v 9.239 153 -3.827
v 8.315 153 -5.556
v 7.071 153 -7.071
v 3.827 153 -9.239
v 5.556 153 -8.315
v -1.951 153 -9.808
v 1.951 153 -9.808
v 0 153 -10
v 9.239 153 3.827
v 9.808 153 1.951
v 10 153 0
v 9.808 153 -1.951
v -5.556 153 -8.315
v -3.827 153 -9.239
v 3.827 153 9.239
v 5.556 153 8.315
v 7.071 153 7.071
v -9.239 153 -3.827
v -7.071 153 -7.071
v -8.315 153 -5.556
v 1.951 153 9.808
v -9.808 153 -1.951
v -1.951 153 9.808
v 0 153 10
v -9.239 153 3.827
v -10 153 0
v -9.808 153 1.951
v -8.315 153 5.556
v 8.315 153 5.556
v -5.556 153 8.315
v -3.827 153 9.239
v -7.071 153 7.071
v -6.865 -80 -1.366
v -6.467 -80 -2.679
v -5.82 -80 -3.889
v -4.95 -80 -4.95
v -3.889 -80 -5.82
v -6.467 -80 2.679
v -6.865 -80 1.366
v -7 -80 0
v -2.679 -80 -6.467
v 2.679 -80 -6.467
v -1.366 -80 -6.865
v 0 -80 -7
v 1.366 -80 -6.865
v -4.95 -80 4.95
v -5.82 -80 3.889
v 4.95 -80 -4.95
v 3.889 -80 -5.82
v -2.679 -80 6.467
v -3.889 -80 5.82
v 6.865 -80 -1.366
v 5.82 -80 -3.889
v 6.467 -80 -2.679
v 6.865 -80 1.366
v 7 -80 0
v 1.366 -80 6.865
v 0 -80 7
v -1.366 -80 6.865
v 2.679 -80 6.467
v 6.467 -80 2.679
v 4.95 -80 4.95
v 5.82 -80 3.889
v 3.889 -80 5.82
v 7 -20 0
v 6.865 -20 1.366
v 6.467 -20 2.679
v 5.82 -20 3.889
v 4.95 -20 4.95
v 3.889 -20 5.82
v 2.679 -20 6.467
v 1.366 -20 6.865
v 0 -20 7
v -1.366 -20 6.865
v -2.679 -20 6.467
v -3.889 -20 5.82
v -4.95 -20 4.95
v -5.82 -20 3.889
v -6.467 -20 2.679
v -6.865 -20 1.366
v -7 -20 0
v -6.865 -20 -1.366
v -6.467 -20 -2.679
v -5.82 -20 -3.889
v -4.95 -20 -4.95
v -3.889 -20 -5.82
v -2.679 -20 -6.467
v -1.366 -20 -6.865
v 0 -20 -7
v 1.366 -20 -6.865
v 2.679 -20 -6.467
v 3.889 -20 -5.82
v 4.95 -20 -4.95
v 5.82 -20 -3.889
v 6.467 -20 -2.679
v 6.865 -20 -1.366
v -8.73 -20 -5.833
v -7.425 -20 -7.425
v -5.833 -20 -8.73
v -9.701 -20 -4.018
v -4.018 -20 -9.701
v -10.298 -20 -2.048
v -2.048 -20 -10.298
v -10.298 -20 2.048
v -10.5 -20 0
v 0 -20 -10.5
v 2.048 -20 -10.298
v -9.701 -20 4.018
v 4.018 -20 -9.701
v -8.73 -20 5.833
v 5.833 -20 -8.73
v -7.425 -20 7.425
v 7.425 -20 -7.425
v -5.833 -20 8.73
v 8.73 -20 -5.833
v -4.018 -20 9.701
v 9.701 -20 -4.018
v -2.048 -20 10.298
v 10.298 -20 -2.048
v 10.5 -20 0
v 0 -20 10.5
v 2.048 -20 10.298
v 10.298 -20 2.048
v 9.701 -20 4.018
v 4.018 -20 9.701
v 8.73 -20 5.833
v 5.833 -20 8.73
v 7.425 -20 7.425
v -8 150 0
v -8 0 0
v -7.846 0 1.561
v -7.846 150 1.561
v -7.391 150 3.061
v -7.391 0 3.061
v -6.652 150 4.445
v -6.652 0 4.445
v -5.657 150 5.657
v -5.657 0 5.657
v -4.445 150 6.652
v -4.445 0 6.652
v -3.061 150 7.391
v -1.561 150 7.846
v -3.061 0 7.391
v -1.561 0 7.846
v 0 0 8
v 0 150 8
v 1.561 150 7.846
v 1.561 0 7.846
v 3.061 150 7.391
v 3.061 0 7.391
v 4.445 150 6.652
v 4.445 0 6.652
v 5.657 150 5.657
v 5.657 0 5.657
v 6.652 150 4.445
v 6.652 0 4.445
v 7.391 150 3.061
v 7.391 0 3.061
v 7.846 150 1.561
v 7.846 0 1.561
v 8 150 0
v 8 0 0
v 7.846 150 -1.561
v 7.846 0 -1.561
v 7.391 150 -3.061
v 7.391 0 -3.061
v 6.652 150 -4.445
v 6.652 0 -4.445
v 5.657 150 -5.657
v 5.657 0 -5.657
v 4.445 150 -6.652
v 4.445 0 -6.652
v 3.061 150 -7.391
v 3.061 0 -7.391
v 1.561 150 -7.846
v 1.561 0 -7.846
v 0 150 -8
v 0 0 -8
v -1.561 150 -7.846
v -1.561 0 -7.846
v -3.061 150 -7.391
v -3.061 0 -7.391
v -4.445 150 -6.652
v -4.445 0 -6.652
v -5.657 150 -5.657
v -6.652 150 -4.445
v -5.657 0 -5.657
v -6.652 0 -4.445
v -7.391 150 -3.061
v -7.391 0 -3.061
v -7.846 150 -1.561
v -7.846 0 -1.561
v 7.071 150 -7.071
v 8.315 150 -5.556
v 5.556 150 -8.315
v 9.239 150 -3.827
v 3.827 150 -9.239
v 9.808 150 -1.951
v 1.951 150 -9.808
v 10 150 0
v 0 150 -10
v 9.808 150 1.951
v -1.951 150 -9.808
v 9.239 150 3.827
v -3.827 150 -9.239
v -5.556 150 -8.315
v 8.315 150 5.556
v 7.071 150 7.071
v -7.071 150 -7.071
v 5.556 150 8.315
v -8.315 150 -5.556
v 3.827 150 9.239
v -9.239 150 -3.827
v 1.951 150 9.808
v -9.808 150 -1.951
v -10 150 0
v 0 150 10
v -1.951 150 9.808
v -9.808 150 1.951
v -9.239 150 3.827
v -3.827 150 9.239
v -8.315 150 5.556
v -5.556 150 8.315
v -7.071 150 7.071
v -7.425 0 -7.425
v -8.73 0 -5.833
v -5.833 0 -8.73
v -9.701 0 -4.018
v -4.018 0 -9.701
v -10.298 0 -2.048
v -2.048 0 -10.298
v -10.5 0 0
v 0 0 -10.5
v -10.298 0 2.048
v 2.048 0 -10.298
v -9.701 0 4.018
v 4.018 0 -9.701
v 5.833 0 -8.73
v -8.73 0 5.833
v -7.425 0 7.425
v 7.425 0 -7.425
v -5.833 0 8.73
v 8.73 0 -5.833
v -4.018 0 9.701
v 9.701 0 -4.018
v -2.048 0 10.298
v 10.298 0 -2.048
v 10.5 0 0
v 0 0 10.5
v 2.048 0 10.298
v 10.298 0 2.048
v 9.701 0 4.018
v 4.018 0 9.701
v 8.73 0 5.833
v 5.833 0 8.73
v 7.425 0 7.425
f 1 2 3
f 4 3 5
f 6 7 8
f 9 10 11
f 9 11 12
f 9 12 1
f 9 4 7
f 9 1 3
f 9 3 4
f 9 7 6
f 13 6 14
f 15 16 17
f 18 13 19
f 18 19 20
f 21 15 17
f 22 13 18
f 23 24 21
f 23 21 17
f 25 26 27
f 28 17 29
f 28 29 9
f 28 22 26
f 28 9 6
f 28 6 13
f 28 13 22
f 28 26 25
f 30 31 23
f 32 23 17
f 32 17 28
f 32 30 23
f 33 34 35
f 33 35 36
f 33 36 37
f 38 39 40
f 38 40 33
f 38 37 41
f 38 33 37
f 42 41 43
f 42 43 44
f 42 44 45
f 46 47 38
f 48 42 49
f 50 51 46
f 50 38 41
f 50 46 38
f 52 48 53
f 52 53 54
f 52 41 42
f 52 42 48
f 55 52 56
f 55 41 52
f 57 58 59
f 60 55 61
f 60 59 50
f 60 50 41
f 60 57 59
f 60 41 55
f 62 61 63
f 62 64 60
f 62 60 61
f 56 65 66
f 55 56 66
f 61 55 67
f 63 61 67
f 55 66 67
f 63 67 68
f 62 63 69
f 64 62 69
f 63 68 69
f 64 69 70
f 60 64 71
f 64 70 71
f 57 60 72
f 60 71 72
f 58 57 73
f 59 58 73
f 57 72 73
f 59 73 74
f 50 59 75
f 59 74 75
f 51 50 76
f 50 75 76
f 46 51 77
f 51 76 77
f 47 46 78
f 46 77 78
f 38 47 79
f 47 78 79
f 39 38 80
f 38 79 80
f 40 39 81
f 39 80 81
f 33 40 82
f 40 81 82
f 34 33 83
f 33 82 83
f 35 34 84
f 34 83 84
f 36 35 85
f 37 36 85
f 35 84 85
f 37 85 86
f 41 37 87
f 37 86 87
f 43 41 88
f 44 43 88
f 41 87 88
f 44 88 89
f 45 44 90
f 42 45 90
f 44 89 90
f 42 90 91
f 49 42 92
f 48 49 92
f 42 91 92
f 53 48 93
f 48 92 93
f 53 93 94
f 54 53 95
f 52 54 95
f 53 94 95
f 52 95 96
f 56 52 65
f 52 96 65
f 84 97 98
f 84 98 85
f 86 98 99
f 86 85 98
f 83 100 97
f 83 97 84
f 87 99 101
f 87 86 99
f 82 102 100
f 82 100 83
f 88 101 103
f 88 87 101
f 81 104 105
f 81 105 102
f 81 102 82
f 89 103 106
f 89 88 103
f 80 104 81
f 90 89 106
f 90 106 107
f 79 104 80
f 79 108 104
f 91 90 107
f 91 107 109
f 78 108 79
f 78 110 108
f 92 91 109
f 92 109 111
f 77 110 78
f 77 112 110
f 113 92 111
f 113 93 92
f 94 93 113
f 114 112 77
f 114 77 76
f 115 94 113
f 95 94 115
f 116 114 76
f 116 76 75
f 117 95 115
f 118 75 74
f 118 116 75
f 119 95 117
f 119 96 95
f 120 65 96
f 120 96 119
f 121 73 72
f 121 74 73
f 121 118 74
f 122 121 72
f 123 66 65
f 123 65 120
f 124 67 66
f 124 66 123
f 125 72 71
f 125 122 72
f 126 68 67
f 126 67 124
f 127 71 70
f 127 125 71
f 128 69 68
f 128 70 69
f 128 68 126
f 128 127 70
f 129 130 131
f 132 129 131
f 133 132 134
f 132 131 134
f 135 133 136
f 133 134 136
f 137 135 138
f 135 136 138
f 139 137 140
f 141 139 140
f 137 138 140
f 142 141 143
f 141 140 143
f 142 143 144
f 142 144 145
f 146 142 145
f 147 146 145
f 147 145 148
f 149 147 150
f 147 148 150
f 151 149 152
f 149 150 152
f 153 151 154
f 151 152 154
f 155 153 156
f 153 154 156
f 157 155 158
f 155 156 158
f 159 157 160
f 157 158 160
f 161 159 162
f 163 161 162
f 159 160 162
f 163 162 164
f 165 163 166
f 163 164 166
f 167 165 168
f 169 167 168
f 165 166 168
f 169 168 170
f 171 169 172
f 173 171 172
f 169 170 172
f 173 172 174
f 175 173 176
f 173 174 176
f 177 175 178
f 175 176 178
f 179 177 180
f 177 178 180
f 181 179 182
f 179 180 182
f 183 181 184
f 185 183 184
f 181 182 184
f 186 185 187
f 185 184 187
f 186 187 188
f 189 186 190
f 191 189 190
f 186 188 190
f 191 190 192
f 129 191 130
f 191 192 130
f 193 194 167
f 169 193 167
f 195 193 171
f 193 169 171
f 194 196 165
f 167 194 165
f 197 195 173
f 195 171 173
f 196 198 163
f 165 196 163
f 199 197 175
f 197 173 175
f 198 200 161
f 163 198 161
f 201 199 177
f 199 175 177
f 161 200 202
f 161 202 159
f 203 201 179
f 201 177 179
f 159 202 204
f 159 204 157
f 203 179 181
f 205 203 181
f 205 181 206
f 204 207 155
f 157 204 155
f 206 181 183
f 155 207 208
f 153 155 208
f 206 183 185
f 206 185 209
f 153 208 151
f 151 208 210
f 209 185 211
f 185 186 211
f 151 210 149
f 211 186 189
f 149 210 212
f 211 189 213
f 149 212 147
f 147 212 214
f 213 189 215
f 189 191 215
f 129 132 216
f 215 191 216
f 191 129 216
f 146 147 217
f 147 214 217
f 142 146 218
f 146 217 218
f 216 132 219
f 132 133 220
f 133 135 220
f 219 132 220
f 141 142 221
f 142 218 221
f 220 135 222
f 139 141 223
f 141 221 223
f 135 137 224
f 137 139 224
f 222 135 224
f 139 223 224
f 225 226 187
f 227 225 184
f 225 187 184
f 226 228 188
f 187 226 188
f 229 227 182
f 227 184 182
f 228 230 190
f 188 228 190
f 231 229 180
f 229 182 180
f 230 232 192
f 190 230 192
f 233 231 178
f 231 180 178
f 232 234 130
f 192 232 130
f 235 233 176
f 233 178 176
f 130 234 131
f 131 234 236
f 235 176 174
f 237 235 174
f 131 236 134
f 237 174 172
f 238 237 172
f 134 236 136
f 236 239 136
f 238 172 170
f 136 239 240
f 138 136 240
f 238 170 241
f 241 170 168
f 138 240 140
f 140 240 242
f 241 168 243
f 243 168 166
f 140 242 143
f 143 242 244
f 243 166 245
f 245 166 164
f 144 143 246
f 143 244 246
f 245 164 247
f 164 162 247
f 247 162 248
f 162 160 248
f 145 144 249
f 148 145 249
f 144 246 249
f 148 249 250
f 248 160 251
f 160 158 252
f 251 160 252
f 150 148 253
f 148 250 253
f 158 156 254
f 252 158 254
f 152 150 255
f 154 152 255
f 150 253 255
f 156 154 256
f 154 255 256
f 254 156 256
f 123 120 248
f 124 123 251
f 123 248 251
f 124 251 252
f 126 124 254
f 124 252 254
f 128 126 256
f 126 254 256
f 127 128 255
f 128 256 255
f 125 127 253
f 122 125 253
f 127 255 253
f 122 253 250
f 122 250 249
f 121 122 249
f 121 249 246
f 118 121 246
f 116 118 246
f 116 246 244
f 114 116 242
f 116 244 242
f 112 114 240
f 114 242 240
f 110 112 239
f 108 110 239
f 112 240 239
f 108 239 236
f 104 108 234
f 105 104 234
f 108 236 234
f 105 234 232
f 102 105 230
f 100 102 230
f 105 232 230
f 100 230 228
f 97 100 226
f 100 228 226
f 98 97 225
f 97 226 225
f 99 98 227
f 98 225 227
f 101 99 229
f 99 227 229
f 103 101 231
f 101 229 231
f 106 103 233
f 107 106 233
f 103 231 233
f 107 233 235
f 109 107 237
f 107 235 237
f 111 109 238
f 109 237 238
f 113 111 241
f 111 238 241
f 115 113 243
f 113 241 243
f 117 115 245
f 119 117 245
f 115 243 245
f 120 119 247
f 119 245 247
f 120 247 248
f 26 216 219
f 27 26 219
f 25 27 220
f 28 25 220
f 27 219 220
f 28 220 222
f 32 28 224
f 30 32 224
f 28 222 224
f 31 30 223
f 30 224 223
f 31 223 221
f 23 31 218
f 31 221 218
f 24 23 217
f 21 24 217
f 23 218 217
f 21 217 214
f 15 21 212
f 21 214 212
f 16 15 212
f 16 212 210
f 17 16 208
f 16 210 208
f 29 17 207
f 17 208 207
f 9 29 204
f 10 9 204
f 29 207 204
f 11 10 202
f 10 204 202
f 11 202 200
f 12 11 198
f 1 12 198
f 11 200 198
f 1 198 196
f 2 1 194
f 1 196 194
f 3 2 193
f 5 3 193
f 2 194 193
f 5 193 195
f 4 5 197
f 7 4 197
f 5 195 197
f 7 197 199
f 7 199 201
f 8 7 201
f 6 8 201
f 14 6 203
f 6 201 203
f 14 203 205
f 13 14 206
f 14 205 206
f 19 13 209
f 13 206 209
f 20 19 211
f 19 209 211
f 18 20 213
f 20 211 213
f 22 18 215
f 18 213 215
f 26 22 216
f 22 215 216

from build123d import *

# Parameters (mm, degrees)
F0_R     = 10.5
F1_DEPTH = 20
F2_R     = 7
F3_DEPTH = 60
F4_R     = 8
F5_R     = 8
F6_DEPTH = 150
F7_R     = 10
F8_DEPTH = 3


with BuildPart() as f1:
    # F0 (on Front) → F1 (new body)
    with BuildSketch(Plane.XZ):
        Circle(F0_R)
    extrude(amount=F1_DEPTH)

    # F2 (on face) → F3 (join)
    with BuildSketch(Plane.XZ.offset(20)):
        Circle(F2_R)
    extrude(amount=F3_DEPTH)

    # F4 (on face) + F5 (on face) → F6 (join)
    with BuildSketch(Plane(origin=(0, 0, 0), x_dir=(-1, 0, 0), z_dir=(0, 1, 0))):
        Circle(F4_R)
    with BuildSketch(Plane(origin=(0, 0, 0), x_dir=(-1, 0, 0), z_dir=(0, 1, 0))):
        Circle(F5_R)
    extrude(amount=F6_DEPTH)

    # F7 (on face) → F8 (join)
    with BuildSketch(Plane(origin=(0, 150, 0), x_dir=(-1, 0, 0), z_dir=(0, 1, 0))):
        Circle(F7_R)
    extrude(amount=F8_DEPTH)


solid = f1.part
